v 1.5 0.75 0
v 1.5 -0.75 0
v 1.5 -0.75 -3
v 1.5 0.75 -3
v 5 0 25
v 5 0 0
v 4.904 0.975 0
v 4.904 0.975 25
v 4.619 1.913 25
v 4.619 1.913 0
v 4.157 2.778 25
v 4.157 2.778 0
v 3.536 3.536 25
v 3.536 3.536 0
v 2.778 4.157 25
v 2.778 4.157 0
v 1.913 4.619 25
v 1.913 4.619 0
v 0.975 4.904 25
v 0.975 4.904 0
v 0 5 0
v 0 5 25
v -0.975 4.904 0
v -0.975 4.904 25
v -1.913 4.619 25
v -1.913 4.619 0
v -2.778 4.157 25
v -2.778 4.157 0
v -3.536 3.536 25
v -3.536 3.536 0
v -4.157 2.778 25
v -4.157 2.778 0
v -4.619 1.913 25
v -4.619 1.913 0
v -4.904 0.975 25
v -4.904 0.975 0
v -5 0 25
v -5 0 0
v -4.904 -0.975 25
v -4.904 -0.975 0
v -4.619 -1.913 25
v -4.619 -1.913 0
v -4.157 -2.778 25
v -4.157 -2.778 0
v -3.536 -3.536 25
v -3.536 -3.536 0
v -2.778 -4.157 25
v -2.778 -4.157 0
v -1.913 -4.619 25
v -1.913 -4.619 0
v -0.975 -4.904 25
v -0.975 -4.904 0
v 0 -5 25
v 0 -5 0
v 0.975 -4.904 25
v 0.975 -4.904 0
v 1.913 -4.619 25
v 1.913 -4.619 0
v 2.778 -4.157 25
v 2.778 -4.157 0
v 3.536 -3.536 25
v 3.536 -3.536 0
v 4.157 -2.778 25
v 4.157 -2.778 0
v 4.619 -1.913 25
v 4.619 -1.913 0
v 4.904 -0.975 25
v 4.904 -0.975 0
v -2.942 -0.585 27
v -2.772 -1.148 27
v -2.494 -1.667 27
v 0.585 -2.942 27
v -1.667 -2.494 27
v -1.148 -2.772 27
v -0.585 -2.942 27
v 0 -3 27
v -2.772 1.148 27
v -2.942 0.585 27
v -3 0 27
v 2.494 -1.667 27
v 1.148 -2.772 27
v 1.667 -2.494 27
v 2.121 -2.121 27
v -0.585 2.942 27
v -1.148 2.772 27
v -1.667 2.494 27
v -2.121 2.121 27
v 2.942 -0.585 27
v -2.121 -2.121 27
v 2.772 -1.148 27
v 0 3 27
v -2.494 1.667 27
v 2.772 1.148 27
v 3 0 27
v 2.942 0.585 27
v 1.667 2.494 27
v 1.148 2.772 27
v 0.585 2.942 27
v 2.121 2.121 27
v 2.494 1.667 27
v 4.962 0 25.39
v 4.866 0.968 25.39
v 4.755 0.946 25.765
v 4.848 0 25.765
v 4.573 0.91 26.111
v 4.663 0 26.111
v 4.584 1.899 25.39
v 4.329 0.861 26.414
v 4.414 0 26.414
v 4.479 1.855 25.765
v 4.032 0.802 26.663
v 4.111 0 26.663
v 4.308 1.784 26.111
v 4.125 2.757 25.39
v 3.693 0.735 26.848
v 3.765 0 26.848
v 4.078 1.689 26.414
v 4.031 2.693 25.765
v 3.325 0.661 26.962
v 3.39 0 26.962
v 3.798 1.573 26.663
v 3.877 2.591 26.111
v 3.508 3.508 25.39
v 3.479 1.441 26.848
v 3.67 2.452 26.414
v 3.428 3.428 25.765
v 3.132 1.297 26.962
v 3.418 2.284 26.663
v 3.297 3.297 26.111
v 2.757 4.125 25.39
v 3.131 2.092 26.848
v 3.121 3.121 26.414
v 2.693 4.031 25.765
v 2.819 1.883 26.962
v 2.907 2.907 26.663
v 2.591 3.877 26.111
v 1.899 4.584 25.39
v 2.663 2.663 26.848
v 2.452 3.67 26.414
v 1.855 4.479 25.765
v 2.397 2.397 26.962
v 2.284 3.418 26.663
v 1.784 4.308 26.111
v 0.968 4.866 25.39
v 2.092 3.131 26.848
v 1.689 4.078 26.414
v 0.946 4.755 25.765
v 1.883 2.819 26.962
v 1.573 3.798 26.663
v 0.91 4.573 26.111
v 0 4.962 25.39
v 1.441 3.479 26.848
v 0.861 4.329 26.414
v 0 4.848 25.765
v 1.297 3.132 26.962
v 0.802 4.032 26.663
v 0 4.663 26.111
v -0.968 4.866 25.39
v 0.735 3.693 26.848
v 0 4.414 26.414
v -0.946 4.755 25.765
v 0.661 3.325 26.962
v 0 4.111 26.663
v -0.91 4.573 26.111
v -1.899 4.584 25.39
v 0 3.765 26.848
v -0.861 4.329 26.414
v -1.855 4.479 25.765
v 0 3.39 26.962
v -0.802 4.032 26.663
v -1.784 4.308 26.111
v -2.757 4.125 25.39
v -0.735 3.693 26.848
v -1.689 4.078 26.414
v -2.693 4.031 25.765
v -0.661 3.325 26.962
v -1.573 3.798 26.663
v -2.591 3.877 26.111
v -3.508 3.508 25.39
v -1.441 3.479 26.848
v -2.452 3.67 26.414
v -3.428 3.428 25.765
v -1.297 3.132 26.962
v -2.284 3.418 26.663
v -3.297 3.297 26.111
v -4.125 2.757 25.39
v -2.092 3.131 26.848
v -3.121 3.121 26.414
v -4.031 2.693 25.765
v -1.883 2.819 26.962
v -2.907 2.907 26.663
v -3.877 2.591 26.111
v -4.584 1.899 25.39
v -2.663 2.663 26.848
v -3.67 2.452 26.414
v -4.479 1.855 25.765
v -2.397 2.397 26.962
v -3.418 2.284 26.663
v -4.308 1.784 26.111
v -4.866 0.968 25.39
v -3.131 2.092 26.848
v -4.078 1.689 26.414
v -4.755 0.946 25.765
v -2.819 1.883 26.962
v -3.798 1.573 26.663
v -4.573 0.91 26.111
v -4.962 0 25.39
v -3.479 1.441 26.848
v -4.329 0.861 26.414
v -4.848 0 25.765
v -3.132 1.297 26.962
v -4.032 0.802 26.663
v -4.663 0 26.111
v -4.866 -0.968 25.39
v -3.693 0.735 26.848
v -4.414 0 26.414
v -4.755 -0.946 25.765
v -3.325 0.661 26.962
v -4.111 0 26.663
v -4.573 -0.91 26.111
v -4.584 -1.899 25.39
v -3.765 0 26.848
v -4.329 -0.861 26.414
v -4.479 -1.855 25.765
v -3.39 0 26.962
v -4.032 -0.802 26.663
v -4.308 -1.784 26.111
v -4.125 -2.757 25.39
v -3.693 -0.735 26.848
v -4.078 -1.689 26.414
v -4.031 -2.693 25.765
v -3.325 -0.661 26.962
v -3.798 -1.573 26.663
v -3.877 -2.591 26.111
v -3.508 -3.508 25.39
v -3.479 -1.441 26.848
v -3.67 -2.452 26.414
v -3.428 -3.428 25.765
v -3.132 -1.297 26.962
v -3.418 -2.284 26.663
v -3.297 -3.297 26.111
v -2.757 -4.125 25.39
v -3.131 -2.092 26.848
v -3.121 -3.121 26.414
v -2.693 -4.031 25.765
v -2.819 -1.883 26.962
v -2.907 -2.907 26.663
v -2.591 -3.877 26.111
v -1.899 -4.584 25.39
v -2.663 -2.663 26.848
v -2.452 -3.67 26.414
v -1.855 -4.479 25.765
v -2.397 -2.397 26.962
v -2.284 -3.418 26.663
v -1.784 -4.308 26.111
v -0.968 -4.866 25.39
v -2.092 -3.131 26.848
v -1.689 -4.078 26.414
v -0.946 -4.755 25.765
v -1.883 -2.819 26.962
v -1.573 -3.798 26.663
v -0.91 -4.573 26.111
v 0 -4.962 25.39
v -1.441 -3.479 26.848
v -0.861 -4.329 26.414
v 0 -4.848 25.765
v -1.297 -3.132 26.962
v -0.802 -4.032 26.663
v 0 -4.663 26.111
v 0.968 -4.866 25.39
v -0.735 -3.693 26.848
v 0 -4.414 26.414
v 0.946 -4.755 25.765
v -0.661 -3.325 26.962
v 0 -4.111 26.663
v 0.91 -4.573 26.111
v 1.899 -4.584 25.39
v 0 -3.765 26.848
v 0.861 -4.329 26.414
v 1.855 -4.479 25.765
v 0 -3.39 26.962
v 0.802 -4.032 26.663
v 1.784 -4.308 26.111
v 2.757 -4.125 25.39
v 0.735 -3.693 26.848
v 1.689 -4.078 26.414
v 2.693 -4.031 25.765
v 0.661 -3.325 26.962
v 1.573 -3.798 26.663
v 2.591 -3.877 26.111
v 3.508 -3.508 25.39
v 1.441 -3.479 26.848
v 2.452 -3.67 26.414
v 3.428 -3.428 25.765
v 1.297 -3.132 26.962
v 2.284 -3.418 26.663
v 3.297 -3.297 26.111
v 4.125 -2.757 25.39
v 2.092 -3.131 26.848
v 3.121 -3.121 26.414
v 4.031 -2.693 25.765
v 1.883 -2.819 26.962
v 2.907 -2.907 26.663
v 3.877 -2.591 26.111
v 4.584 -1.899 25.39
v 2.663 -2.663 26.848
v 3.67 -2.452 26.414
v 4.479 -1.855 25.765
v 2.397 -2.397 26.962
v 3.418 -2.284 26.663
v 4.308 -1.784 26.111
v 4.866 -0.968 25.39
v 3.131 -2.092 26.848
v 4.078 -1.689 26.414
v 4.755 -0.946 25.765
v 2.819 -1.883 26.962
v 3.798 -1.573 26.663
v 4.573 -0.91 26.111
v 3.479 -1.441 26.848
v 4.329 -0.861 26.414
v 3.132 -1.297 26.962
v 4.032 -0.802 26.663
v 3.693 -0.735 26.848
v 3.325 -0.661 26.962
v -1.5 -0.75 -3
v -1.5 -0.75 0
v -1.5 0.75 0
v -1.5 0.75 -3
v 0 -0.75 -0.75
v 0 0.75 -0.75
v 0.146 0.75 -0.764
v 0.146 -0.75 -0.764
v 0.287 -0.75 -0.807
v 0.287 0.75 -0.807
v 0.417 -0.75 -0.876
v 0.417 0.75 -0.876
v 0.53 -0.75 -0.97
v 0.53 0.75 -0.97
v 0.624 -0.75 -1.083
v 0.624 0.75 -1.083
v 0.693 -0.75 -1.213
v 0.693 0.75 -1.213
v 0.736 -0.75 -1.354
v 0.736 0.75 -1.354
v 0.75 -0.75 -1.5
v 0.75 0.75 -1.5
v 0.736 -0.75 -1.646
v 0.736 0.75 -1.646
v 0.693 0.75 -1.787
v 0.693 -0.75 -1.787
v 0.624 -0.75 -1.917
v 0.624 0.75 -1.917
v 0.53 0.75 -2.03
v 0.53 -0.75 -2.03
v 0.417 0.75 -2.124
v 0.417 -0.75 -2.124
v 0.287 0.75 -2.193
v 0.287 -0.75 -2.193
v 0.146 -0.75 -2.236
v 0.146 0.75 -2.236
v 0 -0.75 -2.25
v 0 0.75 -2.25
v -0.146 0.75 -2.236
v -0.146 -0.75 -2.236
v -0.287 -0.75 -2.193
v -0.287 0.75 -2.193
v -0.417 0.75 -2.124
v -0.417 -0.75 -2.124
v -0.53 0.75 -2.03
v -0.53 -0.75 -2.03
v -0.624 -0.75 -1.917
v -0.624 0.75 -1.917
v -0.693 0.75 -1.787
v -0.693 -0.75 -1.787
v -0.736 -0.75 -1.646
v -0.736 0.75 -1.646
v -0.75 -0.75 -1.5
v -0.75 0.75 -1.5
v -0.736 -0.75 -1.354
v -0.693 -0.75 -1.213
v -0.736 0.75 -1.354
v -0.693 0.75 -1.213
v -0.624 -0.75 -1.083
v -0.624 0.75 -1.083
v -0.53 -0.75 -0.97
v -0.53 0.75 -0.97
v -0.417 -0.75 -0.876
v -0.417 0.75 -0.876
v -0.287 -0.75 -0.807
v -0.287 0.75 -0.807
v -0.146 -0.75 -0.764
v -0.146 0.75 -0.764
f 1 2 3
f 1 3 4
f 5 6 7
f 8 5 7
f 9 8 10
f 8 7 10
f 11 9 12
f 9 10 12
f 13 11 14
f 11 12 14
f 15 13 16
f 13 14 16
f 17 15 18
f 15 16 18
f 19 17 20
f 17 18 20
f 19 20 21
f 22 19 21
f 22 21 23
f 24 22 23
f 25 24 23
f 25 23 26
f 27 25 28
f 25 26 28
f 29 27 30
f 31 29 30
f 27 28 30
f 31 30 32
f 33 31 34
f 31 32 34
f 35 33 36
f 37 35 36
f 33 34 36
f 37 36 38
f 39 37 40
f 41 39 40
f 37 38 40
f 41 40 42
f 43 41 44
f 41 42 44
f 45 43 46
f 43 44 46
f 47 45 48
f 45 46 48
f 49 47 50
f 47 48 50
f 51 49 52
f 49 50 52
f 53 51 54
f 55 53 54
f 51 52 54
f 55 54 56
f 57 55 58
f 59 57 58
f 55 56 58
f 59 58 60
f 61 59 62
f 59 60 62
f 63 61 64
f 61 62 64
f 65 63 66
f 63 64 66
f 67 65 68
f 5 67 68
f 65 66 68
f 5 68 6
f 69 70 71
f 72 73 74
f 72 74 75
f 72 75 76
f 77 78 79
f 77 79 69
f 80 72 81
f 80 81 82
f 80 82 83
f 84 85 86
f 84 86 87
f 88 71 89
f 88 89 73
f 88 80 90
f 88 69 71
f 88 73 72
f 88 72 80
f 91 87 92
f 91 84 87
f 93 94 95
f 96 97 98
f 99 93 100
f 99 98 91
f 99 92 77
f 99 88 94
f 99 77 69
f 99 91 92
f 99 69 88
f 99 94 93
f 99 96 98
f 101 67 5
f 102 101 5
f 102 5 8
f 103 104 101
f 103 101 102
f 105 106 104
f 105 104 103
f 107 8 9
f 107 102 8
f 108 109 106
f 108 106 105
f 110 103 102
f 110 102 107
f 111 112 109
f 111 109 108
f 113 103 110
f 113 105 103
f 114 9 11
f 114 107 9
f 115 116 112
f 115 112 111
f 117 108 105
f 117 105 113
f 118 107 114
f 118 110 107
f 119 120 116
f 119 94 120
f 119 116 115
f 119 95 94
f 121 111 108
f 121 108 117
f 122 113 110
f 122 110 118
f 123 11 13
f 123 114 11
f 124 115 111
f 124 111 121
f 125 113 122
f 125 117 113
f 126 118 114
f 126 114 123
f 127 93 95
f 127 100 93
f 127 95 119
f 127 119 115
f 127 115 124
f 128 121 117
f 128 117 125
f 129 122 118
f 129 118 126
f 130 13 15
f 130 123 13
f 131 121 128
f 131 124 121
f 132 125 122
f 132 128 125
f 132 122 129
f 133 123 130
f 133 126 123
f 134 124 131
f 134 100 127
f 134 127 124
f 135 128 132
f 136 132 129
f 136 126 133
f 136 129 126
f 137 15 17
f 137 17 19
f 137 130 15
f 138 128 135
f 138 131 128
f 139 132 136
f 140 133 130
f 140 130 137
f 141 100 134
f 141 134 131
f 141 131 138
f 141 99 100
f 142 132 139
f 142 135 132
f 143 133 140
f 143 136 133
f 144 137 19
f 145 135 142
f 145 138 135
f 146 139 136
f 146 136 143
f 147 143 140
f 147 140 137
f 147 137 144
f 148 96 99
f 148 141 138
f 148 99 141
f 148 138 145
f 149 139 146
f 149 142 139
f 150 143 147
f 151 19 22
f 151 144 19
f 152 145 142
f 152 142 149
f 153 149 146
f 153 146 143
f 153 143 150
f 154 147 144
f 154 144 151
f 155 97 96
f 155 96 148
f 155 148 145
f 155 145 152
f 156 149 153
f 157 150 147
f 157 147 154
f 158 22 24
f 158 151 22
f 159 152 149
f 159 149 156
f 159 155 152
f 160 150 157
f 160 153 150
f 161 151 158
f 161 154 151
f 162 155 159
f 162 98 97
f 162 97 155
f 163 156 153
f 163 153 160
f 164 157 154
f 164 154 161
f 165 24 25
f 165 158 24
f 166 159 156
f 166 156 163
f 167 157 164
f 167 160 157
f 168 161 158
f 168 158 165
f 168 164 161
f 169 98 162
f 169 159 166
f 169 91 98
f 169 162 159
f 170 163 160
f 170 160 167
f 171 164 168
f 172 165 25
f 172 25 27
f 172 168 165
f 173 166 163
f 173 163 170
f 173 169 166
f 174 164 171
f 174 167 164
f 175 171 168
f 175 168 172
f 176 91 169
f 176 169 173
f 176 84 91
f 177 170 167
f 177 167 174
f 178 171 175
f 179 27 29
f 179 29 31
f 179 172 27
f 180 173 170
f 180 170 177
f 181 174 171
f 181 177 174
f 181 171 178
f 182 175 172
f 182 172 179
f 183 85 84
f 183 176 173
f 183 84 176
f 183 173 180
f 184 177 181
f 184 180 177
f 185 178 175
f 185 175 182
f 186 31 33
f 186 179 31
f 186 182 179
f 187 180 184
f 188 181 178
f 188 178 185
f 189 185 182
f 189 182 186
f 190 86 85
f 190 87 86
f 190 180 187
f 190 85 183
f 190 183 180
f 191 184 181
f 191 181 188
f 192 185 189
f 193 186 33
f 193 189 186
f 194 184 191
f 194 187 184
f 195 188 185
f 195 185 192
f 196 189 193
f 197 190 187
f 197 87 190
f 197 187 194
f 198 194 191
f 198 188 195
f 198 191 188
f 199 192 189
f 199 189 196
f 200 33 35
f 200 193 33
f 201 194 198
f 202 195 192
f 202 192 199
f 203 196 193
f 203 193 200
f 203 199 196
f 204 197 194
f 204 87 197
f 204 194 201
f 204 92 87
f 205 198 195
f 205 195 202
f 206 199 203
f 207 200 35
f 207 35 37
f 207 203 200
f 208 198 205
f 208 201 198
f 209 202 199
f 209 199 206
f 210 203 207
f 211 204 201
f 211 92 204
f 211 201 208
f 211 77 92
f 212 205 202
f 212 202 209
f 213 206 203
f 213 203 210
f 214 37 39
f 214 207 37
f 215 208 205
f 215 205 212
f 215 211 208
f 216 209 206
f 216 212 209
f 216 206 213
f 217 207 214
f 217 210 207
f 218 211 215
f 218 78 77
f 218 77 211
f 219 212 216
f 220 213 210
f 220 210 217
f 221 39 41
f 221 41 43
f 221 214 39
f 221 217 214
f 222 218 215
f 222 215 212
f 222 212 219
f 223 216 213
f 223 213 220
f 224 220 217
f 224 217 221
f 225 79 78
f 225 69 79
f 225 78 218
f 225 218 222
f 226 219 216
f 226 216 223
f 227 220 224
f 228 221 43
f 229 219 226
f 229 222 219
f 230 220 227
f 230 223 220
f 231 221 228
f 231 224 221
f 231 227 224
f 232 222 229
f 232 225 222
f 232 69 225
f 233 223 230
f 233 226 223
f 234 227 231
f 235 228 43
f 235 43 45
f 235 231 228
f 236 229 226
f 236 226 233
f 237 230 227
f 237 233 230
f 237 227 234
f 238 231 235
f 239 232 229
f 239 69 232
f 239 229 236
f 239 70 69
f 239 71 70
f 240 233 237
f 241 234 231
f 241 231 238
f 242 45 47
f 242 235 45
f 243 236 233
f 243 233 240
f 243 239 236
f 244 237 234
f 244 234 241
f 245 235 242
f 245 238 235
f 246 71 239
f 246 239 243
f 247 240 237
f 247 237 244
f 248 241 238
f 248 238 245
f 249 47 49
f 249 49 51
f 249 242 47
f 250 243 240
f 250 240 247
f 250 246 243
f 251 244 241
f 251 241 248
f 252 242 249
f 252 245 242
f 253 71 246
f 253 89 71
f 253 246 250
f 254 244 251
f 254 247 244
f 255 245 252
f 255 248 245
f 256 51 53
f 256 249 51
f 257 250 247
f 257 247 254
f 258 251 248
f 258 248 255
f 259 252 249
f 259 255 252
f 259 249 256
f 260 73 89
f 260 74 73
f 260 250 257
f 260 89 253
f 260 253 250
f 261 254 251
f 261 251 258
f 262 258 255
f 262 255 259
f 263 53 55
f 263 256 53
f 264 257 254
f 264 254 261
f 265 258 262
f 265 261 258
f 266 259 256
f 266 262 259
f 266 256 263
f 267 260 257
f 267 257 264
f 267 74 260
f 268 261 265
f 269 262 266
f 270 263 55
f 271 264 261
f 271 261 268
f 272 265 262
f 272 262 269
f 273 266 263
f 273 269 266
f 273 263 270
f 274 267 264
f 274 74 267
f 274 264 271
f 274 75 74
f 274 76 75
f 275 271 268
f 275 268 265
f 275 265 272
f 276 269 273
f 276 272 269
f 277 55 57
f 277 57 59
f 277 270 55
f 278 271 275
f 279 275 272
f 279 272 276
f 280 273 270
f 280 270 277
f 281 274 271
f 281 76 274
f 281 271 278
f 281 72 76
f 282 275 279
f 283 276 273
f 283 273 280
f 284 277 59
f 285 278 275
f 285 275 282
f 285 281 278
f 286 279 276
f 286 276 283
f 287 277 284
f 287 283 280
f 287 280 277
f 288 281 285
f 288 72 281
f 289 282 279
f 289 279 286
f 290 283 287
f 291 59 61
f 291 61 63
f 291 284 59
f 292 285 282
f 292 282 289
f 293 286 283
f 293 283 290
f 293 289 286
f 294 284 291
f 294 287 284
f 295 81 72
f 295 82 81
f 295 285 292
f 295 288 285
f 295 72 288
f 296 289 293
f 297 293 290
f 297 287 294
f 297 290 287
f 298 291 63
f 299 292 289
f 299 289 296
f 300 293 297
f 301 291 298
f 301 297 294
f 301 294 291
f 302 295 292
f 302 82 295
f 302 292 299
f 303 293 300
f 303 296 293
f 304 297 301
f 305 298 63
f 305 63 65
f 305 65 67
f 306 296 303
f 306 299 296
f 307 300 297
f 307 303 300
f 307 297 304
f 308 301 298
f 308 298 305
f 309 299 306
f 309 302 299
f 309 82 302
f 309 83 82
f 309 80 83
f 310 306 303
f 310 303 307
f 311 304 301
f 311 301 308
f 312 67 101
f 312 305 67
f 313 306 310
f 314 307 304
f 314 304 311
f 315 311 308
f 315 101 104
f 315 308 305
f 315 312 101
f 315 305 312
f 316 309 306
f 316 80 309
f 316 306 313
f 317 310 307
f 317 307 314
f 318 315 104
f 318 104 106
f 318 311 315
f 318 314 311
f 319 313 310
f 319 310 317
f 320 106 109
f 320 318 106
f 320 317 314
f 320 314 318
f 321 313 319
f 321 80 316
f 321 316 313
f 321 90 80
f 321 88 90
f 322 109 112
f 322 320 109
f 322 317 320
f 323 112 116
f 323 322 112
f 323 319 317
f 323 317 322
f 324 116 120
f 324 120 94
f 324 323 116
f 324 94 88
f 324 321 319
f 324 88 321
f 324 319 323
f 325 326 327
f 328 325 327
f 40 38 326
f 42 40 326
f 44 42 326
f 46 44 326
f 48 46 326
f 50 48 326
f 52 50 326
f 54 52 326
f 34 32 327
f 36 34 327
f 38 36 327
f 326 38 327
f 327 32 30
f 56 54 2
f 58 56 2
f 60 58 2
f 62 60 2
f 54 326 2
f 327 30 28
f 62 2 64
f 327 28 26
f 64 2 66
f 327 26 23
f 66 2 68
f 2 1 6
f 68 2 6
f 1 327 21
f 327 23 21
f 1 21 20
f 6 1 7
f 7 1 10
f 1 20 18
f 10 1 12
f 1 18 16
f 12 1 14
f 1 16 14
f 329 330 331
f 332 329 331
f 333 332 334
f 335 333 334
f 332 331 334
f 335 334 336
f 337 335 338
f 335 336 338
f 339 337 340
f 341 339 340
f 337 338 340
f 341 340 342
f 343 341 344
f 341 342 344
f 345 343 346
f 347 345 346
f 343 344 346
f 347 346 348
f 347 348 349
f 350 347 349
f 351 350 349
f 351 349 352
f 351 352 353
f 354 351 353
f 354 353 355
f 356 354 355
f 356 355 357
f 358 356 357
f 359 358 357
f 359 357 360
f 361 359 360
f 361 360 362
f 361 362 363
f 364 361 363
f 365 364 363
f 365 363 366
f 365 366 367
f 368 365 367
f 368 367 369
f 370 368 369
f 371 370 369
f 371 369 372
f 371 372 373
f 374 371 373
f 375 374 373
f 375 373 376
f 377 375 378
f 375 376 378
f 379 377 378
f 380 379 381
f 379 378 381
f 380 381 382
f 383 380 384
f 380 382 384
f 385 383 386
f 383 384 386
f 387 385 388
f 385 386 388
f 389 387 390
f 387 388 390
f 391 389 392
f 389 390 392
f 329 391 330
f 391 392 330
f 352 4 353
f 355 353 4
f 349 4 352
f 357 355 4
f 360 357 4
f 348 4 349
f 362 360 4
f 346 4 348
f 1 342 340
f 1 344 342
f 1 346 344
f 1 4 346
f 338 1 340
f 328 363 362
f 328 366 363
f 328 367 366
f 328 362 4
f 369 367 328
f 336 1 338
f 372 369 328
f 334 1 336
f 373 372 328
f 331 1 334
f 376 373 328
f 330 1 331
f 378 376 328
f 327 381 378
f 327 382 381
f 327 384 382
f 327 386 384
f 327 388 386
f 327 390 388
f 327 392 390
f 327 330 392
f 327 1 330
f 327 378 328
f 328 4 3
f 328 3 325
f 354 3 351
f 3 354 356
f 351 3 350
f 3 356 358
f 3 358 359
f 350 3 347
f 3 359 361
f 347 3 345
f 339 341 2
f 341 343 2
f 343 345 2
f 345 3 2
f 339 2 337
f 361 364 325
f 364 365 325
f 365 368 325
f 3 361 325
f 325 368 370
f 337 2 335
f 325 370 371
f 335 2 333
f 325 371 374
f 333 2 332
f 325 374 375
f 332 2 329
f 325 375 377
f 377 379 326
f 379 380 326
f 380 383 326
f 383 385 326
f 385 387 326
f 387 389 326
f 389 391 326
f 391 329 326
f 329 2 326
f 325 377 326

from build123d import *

# Parameters (mm, degrees)
SKETCH1_R           = 5
BOSS_EXTRUDE1_DEPTH = 27
FILLET1_R           = 2
SKETCH2_W           = 3
SKETCH2_H           = 1.5
BOSS_EXTRUDE2_DEPTH = 3
SKETCH3_R           = 0.75
CUT_EXTRUDE1_DEPTH  = 5


with BuildPart() as part:
    # Sketch1 → Boss-Extrude1 (new body)
    with BuildSketch(Plane.XY):
        Circle(SKETCH1_R)
    extrude(amount=BOSS_EXTRUDE1_DEPTH)

    # Fillet1
    fillet1_edges = [part.edges().sort_by_distance(p)[0] for p in [
        (-5, 0, 27),
    ]]
    fillet(fillet1_edges, radius=FILLET1_R)

    # Sketch2 → Boss-Extrude2 (add)
    with BuildSketch(Plane(origin=(0, 0, 0), x_dir=(-1, 0, 0), z_dir=(0, 0, -1))):
        Rectangle(SKETCH2_W, SKETCH2_H)
    extrude(amount=BOSS_EXTRUDE2_DEPTH)

    # Sketch3 → Cut-Extrude1 (cut)
    with BuildSketch(Plane(origin=(0, 0.75, 0), x_dir=(1, 0, 0), z_dir=(0, 1, 0))):
        with Locations(Location((0, 1.5, 0), (0, 0, 270))):
            Circle(SKETCH3_R)
    extrude(amount=-CUT_EXTRUDE1_DEPTH, mode=Mode.SUBTRACT)


solid = part.part
